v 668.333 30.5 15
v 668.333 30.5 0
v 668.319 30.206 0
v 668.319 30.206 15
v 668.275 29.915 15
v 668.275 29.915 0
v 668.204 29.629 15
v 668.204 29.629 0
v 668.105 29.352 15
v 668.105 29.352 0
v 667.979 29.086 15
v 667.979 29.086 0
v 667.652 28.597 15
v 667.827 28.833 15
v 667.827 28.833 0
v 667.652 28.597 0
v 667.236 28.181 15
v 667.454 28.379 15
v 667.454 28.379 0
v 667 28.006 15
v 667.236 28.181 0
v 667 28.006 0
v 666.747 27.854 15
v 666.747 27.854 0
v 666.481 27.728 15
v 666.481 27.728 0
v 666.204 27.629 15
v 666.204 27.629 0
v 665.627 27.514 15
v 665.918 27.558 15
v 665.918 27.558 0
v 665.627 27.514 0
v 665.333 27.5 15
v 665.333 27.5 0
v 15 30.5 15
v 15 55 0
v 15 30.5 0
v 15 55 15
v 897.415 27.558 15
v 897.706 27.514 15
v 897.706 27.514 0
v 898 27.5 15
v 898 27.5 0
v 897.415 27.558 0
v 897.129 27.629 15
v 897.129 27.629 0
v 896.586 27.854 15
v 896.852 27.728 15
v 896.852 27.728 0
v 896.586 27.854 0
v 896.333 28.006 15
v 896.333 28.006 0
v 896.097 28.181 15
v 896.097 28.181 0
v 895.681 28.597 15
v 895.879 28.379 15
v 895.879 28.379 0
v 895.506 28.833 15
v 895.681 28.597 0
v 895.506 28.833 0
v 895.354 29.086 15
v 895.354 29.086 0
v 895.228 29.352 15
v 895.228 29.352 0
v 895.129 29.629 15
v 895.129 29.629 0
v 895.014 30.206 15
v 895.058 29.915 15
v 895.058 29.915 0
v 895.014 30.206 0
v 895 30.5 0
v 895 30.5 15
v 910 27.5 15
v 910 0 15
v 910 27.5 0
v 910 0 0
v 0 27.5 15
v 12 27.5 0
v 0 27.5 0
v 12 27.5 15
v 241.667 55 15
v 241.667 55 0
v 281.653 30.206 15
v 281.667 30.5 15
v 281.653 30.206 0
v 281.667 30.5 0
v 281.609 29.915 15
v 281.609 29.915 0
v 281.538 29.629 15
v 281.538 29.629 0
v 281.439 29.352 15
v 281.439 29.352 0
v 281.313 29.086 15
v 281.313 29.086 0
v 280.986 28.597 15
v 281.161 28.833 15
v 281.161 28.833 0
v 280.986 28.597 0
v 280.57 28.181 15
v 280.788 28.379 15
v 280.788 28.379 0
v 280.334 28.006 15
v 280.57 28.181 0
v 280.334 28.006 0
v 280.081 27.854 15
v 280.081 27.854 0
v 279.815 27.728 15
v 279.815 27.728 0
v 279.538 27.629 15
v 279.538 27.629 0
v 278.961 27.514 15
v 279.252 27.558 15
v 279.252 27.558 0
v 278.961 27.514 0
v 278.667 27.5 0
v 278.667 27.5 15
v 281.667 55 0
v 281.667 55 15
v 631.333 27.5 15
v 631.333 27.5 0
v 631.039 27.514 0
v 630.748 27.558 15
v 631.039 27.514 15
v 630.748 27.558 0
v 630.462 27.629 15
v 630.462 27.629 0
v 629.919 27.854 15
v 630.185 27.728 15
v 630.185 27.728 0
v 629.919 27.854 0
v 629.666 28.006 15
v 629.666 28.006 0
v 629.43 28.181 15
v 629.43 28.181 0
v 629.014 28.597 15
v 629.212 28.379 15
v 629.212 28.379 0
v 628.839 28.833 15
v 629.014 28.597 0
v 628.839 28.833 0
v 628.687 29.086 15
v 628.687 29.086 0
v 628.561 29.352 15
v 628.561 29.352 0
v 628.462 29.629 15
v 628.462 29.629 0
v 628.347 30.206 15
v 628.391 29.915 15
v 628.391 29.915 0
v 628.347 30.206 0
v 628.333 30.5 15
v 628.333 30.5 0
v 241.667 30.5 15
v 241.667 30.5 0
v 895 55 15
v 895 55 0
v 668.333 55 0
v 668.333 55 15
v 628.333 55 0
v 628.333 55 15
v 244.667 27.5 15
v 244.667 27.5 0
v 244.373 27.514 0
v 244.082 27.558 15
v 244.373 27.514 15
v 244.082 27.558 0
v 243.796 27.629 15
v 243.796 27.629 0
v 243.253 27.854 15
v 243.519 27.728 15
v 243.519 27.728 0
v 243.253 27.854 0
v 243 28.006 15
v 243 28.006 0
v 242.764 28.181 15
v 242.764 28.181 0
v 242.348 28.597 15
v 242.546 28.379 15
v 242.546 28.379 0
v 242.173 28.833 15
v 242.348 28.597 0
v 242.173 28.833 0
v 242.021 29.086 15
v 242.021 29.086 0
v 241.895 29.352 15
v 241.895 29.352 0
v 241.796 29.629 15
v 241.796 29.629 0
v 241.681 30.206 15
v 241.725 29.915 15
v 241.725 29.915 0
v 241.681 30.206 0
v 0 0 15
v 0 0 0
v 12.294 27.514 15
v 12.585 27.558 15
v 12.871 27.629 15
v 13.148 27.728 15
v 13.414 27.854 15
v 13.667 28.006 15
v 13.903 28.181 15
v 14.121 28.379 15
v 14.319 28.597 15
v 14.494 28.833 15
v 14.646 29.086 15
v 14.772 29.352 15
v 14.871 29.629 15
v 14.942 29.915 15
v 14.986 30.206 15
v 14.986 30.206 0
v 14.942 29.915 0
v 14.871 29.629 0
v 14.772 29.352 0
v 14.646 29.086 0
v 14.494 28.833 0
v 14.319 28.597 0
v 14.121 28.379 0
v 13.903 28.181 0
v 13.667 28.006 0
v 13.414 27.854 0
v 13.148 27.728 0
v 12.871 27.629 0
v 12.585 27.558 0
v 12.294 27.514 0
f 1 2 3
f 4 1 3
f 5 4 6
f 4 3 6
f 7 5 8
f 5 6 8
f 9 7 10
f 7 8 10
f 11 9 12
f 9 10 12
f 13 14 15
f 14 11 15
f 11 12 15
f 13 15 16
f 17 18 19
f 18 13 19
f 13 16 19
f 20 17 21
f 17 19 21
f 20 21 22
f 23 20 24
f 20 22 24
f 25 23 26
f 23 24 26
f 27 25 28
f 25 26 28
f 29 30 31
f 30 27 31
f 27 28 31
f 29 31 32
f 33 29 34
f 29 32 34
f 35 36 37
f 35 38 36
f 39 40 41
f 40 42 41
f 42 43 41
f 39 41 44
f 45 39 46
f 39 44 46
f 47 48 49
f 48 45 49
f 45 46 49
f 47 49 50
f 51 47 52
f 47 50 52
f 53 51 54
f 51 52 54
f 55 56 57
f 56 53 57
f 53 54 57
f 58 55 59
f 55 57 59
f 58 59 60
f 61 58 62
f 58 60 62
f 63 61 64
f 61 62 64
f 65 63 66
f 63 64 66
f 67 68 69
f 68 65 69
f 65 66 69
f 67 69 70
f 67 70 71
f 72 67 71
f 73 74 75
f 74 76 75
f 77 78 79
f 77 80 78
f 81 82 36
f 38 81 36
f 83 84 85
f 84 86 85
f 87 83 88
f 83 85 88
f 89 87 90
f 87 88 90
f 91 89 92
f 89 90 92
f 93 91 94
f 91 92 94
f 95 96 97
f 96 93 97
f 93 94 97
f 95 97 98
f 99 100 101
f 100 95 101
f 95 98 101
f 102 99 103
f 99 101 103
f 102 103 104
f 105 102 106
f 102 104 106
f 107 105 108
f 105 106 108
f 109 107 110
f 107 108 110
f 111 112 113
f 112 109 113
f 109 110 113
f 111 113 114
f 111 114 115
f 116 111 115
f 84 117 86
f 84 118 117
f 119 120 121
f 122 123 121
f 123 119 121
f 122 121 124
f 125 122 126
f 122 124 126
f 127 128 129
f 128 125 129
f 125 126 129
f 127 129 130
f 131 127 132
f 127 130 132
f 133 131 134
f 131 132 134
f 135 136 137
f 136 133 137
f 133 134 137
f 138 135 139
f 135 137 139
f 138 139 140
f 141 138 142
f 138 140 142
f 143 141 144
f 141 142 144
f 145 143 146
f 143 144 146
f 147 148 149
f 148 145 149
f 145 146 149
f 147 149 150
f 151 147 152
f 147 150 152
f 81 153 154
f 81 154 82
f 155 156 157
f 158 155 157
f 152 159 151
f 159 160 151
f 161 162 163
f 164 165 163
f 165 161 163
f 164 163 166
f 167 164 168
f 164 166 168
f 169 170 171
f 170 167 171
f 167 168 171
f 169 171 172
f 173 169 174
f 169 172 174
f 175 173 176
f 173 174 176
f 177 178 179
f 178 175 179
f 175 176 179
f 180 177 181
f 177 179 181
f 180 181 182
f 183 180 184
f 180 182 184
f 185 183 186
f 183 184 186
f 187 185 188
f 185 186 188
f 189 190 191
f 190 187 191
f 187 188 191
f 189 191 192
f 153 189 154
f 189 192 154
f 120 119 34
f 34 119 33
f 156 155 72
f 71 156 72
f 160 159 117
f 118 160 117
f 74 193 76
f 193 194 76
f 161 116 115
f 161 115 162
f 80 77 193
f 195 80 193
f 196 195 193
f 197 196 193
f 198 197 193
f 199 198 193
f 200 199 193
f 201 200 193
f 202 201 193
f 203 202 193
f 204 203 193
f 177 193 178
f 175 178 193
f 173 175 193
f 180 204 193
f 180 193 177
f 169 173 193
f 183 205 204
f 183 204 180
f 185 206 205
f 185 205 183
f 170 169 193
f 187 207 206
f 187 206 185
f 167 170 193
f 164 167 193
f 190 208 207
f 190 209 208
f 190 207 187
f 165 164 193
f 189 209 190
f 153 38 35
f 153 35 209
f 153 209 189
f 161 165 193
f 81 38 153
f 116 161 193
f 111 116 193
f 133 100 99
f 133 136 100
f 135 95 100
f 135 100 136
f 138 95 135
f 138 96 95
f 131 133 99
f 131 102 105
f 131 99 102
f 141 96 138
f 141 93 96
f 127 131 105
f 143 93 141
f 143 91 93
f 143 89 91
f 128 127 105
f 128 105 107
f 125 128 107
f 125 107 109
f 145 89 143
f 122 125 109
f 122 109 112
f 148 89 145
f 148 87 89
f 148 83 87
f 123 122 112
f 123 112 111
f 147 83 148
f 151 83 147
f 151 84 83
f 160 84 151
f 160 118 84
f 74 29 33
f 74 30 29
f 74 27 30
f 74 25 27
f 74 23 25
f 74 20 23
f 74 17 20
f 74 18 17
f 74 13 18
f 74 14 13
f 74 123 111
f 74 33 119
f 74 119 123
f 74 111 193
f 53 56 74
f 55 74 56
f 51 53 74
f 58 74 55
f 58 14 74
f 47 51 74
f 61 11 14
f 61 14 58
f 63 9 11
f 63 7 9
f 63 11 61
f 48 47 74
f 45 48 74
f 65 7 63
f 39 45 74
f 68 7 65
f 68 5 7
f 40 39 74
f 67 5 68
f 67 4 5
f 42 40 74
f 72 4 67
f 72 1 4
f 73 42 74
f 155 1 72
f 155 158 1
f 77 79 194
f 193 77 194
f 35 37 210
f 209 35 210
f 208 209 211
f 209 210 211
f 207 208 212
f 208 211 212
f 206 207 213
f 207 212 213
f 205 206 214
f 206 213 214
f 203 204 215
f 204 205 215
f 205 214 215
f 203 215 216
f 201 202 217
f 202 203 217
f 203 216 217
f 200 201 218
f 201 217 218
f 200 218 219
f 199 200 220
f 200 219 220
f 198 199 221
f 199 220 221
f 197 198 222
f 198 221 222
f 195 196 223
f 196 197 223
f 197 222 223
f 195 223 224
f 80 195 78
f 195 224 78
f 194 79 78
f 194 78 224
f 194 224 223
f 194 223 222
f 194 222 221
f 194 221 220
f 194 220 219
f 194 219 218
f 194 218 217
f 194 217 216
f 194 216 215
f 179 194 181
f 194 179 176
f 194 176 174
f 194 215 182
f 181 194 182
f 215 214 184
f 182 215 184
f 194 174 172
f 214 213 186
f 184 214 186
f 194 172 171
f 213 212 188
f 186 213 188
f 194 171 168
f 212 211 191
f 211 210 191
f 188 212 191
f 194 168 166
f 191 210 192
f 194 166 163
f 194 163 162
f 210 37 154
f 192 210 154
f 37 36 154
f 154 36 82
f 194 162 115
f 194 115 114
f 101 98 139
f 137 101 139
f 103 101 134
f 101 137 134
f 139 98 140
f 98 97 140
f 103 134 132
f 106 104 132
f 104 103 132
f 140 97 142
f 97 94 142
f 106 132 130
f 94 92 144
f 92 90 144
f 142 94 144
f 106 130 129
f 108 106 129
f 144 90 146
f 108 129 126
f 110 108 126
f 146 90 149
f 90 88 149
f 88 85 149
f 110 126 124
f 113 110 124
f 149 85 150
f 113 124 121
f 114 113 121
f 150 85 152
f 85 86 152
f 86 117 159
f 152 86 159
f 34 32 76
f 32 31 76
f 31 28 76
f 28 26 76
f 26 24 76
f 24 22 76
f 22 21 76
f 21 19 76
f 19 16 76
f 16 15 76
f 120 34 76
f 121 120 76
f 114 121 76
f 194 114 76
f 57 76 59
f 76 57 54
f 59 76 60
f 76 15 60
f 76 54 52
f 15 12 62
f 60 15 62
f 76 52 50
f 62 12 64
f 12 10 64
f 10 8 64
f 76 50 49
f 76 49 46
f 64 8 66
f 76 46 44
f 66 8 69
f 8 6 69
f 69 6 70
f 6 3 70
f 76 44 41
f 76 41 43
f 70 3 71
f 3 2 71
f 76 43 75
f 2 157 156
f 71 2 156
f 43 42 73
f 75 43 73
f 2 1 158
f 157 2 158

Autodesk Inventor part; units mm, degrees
sketch "Sketch1" plane through (0, 0, 0) normal (0, 0, 1) x (1, 0, 0)
  line L0 (0, 0) -> (910, 0)
  line L1 (910, 0) -> (910, 55)
  line L2 (910, 55) -> (0, 55)
  line L3 (0, 55) -> (0, 0)
  dimension "d0" = 910
  dimension "d1" = 55
extrude "Extrusion1" add sketch "Sketch1" along normal blind 15
ref_plane "Work Plane1" through (455, 0, 0) normal (-1, 0, 0) x (0, 0, 1)
sketch "Sketch3" plane through (0, 0, 15) normal (0, 0, 1) x (1, 0, 0)
  line L0 (910, 55) -> (0, 55) projected
  line L1 (0, 55) -> (15, 55)
  line L2 (15, 55) -> (15, 27.5)
  line L3 (15, 27.5) -> (0, 27.5)
  line L4 (0, 27.5) -> (0, 55)
  line L5 (241.667, 55) -> (281.667, 55)
  line L6 (281.667, 55) -> (281.667, 27.5)
  line L7 (281.667, 27.5) -> (241.667, 27.5)
  line L8 (241.667, 27.5) -> (241.667, 55)
  line L9 (455, 55) -> (455, 32.488)
  line L10 (910, 55) -> (895, 55)
  line L11 (895, 55) -> (895, 27.5)
  line L12 (895, 27.5) -> (910, 27.5)
  line L13 (910, 27.5) -> (910, 55)
  line L14 (668.333, 55) -> (628.333, 55)
  line L15 (628.333, 55) -> (628.333, 27.5)
  line L16 (628.333, 27.5) -> (668.333, 27.5)
  line L17 (668.333, 27.5) -> (668.333, 55)
  point P0 (0, 0)
  point P1 (910, 0)
  point P2 (668.333, 55)
  point P3 (628.333, 55)
  dimension "d12" = 15
  dimension "d13" = 27.5
  dimension "d14" = 226.667
  dimension "d15" = 40
extrude "Extrusion2" cut sketch "Sketch3" against normal through all
ref_plane "Work Plane2" through (455, 0, 0) normal (-1, 0, 0) x (0, 0, 1)
ref_plane "Work Plane3" through (0, 0, 7.5) normal (0, 0, 1) x (1, 0, 0)
fillet "Fillet1" radius 3 6 edges at (895, 27.5, 7.5) (668.333, 27.5, 7.5) (628.333, 27.5, 7.5) (281.667, 27.5, 7.5) (241.667, 27.5, 7.5) (15, 27.5, 7.5)
properties part number "Length Board"
